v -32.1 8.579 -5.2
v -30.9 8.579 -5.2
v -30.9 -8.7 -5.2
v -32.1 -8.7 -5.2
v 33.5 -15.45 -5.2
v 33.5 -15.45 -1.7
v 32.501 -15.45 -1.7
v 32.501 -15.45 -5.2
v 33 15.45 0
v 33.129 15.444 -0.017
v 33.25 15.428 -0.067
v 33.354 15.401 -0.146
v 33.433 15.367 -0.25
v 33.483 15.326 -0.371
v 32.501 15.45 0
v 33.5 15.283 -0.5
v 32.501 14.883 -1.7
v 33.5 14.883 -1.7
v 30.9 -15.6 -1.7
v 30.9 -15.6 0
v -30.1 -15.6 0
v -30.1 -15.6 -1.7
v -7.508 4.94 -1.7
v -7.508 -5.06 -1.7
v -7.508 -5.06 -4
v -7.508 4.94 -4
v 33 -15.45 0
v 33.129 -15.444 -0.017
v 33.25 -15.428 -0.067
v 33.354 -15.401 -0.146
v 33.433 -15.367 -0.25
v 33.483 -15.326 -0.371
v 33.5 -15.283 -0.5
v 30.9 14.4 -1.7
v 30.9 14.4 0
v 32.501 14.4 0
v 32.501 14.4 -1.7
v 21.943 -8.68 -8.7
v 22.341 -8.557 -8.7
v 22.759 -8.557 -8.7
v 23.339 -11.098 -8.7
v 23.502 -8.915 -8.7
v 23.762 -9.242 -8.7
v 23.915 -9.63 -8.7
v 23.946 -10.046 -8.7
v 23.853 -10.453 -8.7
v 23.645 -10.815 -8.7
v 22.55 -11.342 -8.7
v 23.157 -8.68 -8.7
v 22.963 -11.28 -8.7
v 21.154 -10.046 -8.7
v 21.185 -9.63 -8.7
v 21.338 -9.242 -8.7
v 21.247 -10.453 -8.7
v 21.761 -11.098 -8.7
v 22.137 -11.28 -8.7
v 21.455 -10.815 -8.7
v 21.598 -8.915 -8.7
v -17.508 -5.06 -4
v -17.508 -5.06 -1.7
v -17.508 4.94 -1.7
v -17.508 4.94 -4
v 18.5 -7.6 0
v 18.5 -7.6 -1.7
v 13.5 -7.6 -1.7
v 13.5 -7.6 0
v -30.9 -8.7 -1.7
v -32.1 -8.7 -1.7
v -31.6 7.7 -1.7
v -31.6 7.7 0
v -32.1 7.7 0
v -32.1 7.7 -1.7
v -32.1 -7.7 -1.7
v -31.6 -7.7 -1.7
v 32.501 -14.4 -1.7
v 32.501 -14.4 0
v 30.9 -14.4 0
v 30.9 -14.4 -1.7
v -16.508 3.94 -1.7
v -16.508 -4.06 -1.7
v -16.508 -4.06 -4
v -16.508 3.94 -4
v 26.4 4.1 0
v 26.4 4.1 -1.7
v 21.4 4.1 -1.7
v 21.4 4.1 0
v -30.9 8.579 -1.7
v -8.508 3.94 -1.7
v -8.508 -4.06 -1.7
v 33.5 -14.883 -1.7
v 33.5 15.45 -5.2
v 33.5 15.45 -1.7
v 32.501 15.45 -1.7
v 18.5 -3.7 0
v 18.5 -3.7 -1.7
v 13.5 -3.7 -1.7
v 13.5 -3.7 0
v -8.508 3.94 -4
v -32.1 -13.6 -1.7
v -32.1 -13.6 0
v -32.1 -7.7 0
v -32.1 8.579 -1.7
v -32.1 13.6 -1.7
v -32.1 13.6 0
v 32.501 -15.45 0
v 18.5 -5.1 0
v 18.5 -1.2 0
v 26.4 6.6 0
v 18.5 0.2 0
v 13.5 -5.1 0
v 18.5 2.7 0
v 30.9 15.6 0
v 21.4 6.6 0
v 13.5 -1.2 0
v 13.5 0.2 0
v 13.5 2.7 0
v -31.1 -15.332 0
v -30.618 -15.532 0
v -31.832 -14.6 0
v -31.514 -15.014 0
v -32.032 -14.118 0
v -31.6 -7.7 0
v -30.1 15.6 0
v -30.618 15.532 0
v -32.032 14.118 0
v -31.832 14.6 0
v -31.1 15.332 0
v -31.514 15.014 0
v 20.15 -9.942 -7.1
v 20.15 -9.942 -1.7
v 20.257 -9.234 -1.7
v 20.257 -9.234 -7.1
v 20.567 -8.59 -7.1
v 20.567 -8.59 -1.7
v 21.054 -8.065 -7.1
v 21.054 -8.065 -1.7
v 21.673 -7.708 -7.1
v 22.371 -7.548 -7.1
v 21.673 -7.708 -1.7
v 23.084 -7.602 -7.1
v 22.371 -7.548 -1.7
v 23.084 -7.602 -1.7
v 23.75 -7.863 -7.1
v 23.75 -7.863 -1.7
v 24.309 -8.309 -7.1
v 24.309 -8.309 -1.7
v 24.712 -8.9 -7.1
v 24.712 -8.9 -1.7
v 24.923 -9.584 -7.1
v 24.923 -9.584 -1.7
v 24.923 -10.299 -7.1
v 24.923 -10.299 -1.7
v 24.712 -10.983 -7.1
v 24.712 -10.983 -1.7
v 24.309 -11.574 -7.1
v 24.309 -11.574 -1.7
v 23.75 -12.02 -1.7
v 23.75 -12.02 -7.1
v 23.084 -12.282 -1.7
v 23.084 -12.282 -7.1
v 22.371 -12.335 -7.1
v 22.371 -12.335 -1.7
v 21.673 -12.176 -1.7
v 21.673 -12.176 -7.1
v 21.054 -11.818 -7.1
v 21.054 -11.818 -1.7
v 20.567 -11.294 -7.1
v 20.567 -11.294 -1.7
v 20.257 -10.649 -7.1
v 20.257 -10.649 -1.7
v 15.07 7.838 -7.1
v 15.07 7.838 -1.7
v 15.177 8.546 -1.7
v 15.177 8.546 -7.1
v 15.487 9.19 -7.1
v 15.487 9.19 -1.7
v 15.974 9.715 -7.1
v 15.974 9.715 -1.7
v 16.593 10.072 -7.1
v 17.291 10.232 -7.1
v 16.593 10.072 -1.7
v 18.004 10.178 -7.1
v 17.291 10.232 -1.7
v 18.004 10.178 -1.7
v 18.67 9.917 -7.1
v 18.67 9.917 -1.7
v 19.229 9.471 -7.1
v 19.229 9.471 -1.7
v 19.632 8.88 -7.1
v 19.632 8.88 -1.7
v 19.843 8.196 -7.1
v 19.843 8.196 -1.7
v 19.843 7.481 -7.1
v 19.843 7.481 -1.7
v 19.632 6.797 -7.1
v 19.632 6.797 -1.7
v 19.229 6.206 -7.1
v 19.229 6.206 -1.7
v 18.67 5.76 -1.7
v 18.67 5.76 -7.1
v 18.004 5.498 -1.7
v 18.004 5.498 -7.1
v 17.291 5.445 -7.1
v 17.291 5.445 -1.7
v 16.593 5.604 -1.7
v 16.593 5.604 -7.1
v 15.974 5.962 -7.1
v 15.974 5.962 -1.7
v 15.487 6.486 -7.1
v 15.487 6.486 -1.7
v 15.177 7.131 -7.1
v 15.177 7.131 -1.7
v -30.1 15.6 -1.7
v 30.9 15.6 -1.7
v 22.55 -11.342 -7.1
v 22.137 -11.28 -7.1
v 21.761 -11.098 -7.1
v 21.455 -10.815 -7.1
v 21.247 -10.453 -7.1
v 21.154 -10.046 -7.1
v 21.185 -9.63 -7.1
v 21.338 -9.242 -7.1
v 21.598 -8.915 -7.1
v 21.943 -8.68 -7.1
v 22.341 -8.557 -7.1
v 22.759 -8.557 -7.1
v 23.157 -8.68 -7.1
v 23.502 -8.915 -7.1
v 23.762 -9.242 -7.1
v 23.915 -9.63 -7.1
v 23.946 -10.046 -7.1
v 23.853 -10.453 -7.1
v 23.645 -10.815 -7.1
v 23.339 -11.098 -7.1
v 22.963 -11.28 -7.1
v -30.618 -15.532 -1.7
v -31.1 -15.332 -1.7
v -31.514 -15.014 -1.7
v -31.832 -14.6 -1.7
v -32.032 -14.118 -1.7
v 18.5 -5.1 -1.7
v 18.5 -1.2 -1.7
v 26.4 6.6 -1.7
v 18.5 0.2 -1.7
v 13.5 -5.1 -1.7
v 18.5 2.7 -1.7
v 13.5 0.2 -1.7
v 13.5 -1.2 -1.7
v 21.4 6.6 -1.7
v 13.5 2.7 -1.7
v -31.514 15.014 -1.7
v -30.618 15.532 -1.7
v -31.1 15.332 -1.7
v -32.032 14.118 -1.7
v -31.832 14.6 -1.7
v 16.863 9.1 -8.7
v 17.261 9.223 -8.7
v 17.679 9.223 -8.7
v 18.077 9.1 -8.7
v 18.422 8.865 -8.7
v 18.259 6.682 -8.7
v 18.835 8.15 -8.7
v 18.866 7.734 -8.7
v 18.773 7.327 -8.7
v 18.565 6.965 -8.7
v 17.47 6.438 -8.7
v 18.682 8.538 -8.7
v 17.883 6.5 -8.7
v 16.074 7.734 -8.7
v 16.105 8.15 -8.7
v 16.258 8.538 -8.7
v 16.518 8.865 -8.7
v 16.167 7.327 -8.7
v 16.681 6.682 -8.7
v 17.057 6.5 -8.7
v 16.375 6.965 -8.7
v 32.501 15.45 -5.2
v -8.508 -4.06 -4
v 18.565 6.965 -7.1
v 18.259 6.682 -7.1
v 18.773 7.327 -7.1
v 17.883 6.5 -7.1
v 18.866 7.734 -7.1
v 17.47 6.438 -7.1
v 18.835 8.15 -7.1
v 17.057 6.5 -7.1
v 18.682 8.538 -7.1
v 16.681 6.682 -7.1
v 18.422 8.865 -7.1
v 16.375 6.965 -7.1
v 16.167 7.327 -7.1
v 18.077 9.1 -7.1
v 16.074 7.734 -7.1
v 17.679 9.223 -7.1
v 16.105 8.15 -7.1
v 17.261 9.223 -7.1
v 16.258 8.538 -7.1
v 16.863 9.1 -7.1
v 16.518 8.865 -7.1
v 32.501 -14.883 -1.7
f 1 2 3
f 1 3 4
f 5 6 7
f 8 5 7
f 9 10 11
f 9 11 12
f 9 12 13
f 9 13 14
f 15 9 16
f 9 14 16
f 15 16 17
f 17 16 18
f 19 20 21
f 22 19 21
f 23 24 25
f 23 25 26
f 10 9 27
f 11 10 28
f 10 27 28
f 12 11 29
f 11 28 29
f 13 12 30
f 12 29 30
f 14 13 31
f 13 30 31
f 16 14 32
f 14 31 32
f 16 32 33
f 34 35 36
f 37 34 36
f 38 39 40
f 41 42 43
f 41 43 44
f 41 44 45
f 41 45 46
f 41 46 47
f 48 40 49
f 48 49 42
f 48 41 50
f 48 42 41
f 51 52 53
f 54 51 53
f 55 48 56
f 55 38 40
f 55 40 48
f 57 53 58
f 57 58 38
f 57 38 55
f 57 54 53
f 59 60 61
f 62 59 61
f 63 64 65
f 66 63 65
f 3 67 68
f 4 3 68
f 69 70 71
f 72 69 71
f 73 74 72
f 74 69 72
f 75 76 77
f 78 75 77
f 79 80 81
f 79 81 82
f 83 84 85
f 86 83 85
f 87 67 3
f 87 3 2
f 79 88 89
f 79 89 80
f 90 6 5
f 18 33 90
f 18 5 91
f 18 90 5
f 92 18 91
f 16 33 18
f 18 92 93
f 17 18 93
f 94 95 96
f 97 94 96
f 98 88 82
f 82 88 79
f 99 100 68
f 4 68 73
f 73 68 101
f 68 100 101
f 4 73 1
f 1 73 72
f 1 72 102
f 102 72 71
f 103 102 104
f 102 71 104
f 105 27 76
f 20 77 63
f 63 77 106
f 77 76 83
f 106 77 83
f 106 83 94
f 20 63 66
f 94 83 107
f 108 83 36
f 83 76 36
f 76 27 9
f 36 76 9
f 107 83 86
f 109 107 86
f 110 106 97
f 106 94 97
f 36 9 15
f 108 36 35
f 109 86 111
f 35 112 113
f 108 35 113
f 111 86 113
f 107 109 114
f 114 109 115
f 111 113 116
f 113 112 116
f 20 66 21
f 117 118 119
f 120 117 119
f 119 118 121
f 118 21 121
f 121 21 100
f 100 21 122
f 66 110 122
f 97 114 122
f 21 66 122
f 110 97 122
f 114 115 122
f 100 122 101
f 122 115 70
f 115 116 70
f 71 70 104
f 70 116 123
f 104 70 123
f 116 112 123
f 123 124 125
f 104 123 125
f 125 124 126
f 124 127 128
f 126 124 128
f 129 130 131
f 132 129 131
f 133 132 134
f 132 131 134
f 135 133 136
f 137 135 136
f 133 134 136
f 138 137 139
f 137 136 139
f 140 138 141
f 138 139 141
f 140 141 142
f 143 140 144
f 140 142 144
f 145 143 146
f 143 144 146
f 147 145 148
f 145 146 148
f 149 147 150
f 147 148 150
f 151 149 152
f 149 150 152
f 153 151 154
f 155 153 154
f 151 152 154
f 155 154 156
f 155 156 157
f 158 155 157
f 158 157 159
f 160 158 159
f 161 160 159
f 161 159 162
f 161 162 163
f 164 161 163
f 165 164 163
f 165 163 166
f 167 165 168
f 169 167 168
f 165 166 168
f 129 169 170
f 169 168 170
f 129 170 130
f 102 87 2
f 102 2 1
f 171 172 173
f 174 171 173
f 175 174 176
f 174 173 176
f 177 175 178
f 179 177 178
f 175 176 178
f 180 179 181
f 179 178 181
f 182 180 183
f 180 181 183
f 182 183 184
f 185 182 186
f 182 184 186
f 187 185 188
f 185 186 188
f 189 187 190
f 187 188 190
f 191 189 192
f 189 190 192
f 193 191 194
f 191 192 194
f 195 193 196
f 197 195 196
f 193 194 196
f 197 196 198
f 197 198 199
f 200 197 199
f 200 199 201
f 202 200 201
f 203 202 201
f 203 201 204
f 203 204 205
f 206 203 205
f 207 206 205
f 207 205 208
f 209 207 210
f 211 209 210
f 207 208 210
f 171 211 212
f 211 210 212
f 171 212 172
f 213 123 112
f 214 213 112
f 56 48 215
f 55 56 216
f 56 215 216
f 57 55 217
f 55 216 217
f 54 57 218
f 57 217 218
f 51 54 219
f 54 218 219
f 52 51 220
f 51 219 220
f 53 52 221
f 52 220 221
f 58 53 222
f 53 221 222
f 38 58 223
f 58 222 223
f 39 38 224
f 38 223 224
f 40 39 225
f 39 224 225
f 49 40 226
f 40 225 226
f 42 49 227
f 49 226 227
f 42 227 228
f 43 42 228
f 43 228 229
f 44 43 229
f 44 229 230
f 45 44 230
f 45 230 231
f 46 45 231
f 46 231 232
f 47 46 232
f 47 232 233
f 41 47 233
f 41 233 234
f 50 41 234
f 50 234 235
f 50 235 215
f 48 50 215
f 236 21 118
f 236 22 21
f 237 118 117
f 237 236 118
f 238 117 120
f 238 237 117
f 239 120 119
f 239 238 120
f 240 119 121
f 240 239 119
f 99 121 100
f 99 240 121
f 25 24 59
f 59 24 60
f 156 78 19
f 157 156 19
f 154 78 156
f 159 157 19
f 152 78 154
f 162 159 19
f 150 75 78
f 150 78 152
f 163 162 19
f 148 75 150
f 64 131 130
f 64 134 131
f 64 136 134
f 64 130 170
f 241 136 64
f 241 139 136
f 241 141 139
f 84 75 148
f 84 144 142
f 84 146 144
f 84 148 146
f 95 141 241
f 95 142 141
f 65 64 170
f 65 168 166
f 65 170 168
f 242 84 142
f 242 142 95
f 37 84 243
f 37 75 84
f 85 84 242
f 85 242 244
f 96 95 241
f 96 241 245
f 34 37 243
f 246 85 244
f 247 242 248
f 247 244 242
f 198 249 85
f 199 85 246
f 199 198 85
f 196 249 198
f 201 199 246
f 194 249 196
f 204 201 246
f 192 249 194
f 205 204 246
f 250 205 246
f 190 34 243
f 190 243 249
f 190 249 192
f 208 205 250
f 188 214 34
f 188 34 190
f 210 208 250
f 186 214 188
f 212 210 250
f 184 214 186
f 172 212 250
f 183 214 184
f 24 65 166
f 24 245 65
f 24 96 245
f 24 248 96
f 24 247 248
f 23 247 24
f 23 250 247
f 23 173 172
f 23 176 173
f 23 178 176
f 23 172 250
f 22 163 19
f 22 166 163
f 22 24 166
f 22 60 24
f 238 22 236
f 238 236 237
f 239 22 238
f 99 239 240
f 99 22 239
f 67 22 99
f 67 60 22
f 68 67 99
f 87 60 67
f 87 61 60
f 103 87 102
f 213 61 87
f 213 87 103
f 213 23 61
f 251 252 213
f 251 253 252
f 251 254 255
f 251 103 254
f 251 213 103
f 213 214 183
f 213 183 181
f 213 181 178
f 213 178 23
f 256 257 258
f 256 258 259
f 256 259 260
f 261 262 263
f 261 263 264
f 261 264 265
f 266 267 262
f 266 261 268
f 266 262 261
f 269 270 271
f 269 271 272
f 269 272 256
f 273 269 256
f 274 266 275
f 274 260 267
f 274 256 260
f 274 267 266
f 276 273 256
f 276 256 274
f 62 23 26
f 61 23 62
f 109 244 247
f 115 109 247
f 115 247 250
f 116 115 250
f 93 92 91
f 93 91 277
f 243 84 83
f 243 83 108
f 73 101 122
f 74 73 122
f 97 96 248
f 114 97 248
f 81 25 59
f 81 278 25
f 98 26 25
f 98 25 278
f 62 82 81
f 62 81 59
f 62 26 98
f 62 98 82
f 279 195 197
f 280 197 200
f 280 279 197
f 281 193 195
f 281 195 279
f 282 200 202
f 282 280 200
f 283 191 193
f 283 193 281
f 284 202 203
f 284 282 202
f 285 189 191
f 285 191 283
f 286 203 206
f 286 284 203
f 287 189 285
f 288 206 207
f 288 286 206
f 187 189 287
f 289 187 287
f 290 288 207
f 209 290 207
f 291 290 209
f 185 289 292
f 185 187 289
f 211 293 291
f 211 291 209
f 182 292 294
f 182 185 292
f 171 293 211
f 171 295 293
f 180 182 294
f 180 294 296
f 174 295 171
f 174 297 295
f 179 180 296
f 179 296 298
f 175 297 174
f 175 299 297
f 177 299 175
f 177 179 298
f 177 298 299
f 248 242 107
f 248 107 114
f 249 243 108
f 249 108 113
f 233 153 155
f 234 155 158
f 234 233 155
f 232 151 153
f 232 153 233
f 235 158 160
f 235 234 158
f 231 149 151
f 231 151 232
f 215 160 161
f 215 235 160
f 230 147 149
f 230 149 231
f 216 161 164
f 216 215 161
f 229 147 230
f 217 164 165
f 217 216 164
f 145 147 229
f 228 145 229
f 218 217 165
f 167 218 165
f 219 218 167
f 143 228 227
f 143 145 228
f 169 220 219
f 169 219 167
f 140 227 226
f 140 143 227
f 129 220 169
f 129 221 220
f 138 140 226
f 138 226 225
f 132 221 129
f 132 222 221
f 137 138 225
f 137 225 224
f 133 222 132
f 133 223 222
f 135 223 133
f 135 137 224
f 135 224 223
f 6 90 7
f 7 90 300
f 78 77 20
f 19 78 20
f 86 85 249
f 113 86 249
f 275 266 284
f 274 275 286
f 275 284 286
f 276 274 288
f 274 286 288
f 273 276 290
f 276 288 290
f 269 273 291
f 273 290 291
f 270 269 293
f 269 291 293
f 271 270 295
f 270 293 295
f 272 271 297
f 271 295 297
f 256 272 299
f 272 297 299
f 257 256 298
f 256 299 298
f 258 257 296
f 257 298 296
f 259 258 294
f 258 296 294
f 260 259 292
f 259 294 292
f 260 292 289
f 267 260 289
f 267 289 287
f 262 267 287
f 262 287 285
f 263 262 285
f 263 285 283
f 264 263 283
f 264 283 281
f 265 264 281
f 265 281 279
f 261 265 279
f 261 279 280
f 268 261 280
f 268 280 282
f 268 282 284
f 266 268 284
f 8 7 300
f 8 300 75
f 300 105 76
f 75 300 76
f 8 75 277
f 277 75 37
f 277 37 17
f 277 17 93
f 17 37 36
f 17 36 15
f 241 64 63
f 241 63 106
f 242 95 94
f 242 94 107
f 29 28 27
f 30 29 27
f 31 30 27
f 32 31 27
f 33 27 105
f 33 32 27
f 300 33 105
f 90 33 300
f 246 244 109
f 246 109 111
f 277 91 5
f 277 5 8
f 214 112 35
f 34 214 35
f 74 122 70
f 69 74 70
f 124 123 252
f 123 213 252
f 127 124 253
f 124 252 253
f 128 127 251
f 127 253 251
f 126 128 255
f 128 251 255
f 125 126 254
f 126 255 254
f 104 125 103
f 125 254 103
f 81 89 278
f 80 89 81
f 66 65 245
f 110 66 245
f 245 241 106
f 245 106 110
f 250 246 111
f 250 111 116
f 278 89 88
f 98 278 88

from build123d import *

# Parameters (mm, degrees)
BOSS_EXTRUDE1_DEPTH = 1.7
SKETCH2_W           = 1.2
SKETCH2_H           = 17.279106444
BOSS_EXTRUDE2_DEPTH = 3.5
CUT_EXTRUDE1_REACH  = 69.63
SKETCH4_W           = 0.999194929
SKETCH4_H           = 30.9
BOSS_EXTRUDE3_DEPTH = 3.5
FILLET1_R           = 2
FILLET2_R           = 0.5
SKETCH5_W           = 5
SKETCH5_H           = 2.5
CUT_EXTRUDE2_DEPTH  = 38.119536635
SKETCH6_W           = 10
SKETCH6_H           = 10
SKETCH6_W_2         = 8
SKETCH6_H_2         = 8
EXTRUDE_THIN1_DEPTH = 2.3
SKETCH8_R           = 1.4
BOSS_EXTRUDE4_DEPTH = 7
SKETCH8_2_R         = 2.4
SKETCH8_2_R_2       = 1.4
EXTRUDE_THIN2_DEPTH = 5.4


with BuildPart() as part:
    # Sketch1 → Boss-Extrude1 (new body)
    with BuildSketch(Plane.XY):
        Polygon((-32.1, 15.6), (30.9, 15.6), (30.9, 14.4), (32.500805071, 14.4), (32.500805071, 15.45), (33.5, 15.45), (33.5, -15.45), (32.500805071, -15.45), (32.500805071, -14.4), (30.9, -14.4), (30.9, -15.6), (-32.1, -15.6), (-32.1, -7.7), (-31.6, -7.7), (-31.6, 7.7), (-32.1, 7.7), align=None)
    extrude(amount=-BOSS_EXTRUDE1_DEPTH)

    # Sketch2 → Boss-Extrude2 (add)
    with BuildSketch(Plane(origin=(0, 0, -1.7), x_dir=(-1, 0, 0), z_dir=(0, 0, -1))):
        with Locations((31.5, -0.060446778)):
            Rectangle(SKETCH2_W, SKETCH2_H)
    extrude(amount=BOSS_EXTRUDE2_DEPTH)

    # Sketch3 → Cut-Extrude1 (cut, up to next)
    with BuildSketch(Plane(origin=(33.5, 0, 0), x_dir=(0, 0, -1), z_dir=(1, 0, 0)), mode=Mode.PRIVATE) as cut_extrude1_sk1:
        Polygon((1.7, 15.45), (0, 15.45), (1.7, 14.883333333), align=None)
    cut_extrude1_tool1 = extrude(cut_extrude1_sk1.sketch, amount=-CUT_EXTRUDE1_REACH, mode=Mode.PRIVATE) & part.part
    cut_extrude1 = cut_extrude1_tool1.solids().sort_by_distance((33.5, 15.261111, -1.133333))[0]
    add(cut_extrude1, mode=Mode.SUBTRACT)

    # Mirror1: Cut-Extrude1 across plane
    add(cut_extrude1.mirror(Plane.ZX), mode=Mode.SUBTRACT)

    # Sketch4 → Boss-Extrude3 (add)
    with BuildSketch(Plane(origin=(0, 0, -1.7), x_dir=(-1, 0, 0), z_dir=(0, 0, -1))):
        with Locations((-33.000402536, 0)):
            Rectangle(SKETCH4_W, SKETCH4_H)
    extrude(amount=BOSS_EXTRUDE3_DEPTH)

    # Fillet1
    fillet1_edges = [part.edges().sort_by_distance(p)[0] for p in [
        (-32.1, -15.6, -0.85),
        (-32.1, 15.6, -0.85),
    ]]
    fillet(fillet1_edges, radius=FILLET1_R)

    # Fillet2
    fillet2_edges = [part.edges().sort_by_distance(p)[0] for p in [
        (33.5, 0, 0),
    ]]
    fillet(fillet2_edges, radius=FILLET2_R)

    # Sketch5 → Cut-Extrude2 (cut, through all)
    with BuildSketch(Plane(origin=(0, 0, -1.7), x_dir=(-1, 0, 0), z_dir=(0, 0, -1))):
        with Locations((-16, -6.35)):
            Rectangle(SKETCH5_W, SKETCH5_H)
        with Locations((-16, -2.45)):
            Rectangle(SKETCH5_W, SKETCH5_H)
        with Locations((-16, 1.45)):
            Rectangle(SKETCH5_W, SKETCH5_H)
        with Locations((-23.9, 5.35)):
            Rectangle(SKETCH5_W, SKETCH5_H)
    extrude(amount=-CUT_EXTRUDE2_DEPTH, mode=Mode.SUBTRACT)

    # Sketch6 → Extrude-Thin1 (add)
    with BuildSketch(Plane(origin=(0, 0, -1.7), x_dir=(-1, 0, 0), z_dir=(0, 0, -1))):
        with Locations((12.508033049, -0.060446778)):
            Rectangle(SKETCH6_W, SKETCH6_H)
        with Locations((12.508033049, -0.060446778)):
            Rectangle(SKETCH6_W_2, SKETCH6_H_2, mode=Mode.SUBTRACT)
    extrude(amount=EXTRUDE_THIN1_DEPTH)

    # Sketch8 → Boss-Extrude4 (add)
    with BuildSketch(Plane(origin=(0, 0, -1.7), x_dir=(-1, 0, 0), z_dir=(0, 0, -1))):
        with Locations(Location((-22.549962349, -9.941736634, 0), (0, 0, 270))):
            Circle(SKETCH8_R)
        with Locations(Location((-17.469962349, 7.838263366, 0), (0, 0, 270))):
            Circle(SKETCH8_R)
    extrude(amount=BOSS_EXTRUDE4_DEPTH)

    # Sketch8<2> → Extrude-Thin2 (add)
    # profile 1 of 2: a face of its own
    with BuildSketch(Plane(origin=(0, 0, -1.7), x_dir=(-1, 0, 0), z_dir=(0, 0, -1))):
        with Locations((-22.549962349, -9.941736634)):
            Circle(SKETCH8_2_R)
        with Locations((-22.549962349, -9.941736634)):
            Circle(SKETCH8_2_R_2, mode=Mode.SUBTRACT)
    # profile 2 of 2: a face of its own
    with BuildSketch(Plane(origin=(0, 0, -1.7), x_dir=(-1, 0, 0), z_dir=(0, 0, -1))):
        with Locations((-17.469962349, 7.838263366)):
            Circle(SKETCH8_2_R)
        with Locations((-17.469962349, 7.838263366)):
            Circle(SKETCH8_2_R_2, mode=Mode.SUBTRACT)
    extrude(amount=EXTRUDE_THIN2_DEPTH)


solid = part.part
